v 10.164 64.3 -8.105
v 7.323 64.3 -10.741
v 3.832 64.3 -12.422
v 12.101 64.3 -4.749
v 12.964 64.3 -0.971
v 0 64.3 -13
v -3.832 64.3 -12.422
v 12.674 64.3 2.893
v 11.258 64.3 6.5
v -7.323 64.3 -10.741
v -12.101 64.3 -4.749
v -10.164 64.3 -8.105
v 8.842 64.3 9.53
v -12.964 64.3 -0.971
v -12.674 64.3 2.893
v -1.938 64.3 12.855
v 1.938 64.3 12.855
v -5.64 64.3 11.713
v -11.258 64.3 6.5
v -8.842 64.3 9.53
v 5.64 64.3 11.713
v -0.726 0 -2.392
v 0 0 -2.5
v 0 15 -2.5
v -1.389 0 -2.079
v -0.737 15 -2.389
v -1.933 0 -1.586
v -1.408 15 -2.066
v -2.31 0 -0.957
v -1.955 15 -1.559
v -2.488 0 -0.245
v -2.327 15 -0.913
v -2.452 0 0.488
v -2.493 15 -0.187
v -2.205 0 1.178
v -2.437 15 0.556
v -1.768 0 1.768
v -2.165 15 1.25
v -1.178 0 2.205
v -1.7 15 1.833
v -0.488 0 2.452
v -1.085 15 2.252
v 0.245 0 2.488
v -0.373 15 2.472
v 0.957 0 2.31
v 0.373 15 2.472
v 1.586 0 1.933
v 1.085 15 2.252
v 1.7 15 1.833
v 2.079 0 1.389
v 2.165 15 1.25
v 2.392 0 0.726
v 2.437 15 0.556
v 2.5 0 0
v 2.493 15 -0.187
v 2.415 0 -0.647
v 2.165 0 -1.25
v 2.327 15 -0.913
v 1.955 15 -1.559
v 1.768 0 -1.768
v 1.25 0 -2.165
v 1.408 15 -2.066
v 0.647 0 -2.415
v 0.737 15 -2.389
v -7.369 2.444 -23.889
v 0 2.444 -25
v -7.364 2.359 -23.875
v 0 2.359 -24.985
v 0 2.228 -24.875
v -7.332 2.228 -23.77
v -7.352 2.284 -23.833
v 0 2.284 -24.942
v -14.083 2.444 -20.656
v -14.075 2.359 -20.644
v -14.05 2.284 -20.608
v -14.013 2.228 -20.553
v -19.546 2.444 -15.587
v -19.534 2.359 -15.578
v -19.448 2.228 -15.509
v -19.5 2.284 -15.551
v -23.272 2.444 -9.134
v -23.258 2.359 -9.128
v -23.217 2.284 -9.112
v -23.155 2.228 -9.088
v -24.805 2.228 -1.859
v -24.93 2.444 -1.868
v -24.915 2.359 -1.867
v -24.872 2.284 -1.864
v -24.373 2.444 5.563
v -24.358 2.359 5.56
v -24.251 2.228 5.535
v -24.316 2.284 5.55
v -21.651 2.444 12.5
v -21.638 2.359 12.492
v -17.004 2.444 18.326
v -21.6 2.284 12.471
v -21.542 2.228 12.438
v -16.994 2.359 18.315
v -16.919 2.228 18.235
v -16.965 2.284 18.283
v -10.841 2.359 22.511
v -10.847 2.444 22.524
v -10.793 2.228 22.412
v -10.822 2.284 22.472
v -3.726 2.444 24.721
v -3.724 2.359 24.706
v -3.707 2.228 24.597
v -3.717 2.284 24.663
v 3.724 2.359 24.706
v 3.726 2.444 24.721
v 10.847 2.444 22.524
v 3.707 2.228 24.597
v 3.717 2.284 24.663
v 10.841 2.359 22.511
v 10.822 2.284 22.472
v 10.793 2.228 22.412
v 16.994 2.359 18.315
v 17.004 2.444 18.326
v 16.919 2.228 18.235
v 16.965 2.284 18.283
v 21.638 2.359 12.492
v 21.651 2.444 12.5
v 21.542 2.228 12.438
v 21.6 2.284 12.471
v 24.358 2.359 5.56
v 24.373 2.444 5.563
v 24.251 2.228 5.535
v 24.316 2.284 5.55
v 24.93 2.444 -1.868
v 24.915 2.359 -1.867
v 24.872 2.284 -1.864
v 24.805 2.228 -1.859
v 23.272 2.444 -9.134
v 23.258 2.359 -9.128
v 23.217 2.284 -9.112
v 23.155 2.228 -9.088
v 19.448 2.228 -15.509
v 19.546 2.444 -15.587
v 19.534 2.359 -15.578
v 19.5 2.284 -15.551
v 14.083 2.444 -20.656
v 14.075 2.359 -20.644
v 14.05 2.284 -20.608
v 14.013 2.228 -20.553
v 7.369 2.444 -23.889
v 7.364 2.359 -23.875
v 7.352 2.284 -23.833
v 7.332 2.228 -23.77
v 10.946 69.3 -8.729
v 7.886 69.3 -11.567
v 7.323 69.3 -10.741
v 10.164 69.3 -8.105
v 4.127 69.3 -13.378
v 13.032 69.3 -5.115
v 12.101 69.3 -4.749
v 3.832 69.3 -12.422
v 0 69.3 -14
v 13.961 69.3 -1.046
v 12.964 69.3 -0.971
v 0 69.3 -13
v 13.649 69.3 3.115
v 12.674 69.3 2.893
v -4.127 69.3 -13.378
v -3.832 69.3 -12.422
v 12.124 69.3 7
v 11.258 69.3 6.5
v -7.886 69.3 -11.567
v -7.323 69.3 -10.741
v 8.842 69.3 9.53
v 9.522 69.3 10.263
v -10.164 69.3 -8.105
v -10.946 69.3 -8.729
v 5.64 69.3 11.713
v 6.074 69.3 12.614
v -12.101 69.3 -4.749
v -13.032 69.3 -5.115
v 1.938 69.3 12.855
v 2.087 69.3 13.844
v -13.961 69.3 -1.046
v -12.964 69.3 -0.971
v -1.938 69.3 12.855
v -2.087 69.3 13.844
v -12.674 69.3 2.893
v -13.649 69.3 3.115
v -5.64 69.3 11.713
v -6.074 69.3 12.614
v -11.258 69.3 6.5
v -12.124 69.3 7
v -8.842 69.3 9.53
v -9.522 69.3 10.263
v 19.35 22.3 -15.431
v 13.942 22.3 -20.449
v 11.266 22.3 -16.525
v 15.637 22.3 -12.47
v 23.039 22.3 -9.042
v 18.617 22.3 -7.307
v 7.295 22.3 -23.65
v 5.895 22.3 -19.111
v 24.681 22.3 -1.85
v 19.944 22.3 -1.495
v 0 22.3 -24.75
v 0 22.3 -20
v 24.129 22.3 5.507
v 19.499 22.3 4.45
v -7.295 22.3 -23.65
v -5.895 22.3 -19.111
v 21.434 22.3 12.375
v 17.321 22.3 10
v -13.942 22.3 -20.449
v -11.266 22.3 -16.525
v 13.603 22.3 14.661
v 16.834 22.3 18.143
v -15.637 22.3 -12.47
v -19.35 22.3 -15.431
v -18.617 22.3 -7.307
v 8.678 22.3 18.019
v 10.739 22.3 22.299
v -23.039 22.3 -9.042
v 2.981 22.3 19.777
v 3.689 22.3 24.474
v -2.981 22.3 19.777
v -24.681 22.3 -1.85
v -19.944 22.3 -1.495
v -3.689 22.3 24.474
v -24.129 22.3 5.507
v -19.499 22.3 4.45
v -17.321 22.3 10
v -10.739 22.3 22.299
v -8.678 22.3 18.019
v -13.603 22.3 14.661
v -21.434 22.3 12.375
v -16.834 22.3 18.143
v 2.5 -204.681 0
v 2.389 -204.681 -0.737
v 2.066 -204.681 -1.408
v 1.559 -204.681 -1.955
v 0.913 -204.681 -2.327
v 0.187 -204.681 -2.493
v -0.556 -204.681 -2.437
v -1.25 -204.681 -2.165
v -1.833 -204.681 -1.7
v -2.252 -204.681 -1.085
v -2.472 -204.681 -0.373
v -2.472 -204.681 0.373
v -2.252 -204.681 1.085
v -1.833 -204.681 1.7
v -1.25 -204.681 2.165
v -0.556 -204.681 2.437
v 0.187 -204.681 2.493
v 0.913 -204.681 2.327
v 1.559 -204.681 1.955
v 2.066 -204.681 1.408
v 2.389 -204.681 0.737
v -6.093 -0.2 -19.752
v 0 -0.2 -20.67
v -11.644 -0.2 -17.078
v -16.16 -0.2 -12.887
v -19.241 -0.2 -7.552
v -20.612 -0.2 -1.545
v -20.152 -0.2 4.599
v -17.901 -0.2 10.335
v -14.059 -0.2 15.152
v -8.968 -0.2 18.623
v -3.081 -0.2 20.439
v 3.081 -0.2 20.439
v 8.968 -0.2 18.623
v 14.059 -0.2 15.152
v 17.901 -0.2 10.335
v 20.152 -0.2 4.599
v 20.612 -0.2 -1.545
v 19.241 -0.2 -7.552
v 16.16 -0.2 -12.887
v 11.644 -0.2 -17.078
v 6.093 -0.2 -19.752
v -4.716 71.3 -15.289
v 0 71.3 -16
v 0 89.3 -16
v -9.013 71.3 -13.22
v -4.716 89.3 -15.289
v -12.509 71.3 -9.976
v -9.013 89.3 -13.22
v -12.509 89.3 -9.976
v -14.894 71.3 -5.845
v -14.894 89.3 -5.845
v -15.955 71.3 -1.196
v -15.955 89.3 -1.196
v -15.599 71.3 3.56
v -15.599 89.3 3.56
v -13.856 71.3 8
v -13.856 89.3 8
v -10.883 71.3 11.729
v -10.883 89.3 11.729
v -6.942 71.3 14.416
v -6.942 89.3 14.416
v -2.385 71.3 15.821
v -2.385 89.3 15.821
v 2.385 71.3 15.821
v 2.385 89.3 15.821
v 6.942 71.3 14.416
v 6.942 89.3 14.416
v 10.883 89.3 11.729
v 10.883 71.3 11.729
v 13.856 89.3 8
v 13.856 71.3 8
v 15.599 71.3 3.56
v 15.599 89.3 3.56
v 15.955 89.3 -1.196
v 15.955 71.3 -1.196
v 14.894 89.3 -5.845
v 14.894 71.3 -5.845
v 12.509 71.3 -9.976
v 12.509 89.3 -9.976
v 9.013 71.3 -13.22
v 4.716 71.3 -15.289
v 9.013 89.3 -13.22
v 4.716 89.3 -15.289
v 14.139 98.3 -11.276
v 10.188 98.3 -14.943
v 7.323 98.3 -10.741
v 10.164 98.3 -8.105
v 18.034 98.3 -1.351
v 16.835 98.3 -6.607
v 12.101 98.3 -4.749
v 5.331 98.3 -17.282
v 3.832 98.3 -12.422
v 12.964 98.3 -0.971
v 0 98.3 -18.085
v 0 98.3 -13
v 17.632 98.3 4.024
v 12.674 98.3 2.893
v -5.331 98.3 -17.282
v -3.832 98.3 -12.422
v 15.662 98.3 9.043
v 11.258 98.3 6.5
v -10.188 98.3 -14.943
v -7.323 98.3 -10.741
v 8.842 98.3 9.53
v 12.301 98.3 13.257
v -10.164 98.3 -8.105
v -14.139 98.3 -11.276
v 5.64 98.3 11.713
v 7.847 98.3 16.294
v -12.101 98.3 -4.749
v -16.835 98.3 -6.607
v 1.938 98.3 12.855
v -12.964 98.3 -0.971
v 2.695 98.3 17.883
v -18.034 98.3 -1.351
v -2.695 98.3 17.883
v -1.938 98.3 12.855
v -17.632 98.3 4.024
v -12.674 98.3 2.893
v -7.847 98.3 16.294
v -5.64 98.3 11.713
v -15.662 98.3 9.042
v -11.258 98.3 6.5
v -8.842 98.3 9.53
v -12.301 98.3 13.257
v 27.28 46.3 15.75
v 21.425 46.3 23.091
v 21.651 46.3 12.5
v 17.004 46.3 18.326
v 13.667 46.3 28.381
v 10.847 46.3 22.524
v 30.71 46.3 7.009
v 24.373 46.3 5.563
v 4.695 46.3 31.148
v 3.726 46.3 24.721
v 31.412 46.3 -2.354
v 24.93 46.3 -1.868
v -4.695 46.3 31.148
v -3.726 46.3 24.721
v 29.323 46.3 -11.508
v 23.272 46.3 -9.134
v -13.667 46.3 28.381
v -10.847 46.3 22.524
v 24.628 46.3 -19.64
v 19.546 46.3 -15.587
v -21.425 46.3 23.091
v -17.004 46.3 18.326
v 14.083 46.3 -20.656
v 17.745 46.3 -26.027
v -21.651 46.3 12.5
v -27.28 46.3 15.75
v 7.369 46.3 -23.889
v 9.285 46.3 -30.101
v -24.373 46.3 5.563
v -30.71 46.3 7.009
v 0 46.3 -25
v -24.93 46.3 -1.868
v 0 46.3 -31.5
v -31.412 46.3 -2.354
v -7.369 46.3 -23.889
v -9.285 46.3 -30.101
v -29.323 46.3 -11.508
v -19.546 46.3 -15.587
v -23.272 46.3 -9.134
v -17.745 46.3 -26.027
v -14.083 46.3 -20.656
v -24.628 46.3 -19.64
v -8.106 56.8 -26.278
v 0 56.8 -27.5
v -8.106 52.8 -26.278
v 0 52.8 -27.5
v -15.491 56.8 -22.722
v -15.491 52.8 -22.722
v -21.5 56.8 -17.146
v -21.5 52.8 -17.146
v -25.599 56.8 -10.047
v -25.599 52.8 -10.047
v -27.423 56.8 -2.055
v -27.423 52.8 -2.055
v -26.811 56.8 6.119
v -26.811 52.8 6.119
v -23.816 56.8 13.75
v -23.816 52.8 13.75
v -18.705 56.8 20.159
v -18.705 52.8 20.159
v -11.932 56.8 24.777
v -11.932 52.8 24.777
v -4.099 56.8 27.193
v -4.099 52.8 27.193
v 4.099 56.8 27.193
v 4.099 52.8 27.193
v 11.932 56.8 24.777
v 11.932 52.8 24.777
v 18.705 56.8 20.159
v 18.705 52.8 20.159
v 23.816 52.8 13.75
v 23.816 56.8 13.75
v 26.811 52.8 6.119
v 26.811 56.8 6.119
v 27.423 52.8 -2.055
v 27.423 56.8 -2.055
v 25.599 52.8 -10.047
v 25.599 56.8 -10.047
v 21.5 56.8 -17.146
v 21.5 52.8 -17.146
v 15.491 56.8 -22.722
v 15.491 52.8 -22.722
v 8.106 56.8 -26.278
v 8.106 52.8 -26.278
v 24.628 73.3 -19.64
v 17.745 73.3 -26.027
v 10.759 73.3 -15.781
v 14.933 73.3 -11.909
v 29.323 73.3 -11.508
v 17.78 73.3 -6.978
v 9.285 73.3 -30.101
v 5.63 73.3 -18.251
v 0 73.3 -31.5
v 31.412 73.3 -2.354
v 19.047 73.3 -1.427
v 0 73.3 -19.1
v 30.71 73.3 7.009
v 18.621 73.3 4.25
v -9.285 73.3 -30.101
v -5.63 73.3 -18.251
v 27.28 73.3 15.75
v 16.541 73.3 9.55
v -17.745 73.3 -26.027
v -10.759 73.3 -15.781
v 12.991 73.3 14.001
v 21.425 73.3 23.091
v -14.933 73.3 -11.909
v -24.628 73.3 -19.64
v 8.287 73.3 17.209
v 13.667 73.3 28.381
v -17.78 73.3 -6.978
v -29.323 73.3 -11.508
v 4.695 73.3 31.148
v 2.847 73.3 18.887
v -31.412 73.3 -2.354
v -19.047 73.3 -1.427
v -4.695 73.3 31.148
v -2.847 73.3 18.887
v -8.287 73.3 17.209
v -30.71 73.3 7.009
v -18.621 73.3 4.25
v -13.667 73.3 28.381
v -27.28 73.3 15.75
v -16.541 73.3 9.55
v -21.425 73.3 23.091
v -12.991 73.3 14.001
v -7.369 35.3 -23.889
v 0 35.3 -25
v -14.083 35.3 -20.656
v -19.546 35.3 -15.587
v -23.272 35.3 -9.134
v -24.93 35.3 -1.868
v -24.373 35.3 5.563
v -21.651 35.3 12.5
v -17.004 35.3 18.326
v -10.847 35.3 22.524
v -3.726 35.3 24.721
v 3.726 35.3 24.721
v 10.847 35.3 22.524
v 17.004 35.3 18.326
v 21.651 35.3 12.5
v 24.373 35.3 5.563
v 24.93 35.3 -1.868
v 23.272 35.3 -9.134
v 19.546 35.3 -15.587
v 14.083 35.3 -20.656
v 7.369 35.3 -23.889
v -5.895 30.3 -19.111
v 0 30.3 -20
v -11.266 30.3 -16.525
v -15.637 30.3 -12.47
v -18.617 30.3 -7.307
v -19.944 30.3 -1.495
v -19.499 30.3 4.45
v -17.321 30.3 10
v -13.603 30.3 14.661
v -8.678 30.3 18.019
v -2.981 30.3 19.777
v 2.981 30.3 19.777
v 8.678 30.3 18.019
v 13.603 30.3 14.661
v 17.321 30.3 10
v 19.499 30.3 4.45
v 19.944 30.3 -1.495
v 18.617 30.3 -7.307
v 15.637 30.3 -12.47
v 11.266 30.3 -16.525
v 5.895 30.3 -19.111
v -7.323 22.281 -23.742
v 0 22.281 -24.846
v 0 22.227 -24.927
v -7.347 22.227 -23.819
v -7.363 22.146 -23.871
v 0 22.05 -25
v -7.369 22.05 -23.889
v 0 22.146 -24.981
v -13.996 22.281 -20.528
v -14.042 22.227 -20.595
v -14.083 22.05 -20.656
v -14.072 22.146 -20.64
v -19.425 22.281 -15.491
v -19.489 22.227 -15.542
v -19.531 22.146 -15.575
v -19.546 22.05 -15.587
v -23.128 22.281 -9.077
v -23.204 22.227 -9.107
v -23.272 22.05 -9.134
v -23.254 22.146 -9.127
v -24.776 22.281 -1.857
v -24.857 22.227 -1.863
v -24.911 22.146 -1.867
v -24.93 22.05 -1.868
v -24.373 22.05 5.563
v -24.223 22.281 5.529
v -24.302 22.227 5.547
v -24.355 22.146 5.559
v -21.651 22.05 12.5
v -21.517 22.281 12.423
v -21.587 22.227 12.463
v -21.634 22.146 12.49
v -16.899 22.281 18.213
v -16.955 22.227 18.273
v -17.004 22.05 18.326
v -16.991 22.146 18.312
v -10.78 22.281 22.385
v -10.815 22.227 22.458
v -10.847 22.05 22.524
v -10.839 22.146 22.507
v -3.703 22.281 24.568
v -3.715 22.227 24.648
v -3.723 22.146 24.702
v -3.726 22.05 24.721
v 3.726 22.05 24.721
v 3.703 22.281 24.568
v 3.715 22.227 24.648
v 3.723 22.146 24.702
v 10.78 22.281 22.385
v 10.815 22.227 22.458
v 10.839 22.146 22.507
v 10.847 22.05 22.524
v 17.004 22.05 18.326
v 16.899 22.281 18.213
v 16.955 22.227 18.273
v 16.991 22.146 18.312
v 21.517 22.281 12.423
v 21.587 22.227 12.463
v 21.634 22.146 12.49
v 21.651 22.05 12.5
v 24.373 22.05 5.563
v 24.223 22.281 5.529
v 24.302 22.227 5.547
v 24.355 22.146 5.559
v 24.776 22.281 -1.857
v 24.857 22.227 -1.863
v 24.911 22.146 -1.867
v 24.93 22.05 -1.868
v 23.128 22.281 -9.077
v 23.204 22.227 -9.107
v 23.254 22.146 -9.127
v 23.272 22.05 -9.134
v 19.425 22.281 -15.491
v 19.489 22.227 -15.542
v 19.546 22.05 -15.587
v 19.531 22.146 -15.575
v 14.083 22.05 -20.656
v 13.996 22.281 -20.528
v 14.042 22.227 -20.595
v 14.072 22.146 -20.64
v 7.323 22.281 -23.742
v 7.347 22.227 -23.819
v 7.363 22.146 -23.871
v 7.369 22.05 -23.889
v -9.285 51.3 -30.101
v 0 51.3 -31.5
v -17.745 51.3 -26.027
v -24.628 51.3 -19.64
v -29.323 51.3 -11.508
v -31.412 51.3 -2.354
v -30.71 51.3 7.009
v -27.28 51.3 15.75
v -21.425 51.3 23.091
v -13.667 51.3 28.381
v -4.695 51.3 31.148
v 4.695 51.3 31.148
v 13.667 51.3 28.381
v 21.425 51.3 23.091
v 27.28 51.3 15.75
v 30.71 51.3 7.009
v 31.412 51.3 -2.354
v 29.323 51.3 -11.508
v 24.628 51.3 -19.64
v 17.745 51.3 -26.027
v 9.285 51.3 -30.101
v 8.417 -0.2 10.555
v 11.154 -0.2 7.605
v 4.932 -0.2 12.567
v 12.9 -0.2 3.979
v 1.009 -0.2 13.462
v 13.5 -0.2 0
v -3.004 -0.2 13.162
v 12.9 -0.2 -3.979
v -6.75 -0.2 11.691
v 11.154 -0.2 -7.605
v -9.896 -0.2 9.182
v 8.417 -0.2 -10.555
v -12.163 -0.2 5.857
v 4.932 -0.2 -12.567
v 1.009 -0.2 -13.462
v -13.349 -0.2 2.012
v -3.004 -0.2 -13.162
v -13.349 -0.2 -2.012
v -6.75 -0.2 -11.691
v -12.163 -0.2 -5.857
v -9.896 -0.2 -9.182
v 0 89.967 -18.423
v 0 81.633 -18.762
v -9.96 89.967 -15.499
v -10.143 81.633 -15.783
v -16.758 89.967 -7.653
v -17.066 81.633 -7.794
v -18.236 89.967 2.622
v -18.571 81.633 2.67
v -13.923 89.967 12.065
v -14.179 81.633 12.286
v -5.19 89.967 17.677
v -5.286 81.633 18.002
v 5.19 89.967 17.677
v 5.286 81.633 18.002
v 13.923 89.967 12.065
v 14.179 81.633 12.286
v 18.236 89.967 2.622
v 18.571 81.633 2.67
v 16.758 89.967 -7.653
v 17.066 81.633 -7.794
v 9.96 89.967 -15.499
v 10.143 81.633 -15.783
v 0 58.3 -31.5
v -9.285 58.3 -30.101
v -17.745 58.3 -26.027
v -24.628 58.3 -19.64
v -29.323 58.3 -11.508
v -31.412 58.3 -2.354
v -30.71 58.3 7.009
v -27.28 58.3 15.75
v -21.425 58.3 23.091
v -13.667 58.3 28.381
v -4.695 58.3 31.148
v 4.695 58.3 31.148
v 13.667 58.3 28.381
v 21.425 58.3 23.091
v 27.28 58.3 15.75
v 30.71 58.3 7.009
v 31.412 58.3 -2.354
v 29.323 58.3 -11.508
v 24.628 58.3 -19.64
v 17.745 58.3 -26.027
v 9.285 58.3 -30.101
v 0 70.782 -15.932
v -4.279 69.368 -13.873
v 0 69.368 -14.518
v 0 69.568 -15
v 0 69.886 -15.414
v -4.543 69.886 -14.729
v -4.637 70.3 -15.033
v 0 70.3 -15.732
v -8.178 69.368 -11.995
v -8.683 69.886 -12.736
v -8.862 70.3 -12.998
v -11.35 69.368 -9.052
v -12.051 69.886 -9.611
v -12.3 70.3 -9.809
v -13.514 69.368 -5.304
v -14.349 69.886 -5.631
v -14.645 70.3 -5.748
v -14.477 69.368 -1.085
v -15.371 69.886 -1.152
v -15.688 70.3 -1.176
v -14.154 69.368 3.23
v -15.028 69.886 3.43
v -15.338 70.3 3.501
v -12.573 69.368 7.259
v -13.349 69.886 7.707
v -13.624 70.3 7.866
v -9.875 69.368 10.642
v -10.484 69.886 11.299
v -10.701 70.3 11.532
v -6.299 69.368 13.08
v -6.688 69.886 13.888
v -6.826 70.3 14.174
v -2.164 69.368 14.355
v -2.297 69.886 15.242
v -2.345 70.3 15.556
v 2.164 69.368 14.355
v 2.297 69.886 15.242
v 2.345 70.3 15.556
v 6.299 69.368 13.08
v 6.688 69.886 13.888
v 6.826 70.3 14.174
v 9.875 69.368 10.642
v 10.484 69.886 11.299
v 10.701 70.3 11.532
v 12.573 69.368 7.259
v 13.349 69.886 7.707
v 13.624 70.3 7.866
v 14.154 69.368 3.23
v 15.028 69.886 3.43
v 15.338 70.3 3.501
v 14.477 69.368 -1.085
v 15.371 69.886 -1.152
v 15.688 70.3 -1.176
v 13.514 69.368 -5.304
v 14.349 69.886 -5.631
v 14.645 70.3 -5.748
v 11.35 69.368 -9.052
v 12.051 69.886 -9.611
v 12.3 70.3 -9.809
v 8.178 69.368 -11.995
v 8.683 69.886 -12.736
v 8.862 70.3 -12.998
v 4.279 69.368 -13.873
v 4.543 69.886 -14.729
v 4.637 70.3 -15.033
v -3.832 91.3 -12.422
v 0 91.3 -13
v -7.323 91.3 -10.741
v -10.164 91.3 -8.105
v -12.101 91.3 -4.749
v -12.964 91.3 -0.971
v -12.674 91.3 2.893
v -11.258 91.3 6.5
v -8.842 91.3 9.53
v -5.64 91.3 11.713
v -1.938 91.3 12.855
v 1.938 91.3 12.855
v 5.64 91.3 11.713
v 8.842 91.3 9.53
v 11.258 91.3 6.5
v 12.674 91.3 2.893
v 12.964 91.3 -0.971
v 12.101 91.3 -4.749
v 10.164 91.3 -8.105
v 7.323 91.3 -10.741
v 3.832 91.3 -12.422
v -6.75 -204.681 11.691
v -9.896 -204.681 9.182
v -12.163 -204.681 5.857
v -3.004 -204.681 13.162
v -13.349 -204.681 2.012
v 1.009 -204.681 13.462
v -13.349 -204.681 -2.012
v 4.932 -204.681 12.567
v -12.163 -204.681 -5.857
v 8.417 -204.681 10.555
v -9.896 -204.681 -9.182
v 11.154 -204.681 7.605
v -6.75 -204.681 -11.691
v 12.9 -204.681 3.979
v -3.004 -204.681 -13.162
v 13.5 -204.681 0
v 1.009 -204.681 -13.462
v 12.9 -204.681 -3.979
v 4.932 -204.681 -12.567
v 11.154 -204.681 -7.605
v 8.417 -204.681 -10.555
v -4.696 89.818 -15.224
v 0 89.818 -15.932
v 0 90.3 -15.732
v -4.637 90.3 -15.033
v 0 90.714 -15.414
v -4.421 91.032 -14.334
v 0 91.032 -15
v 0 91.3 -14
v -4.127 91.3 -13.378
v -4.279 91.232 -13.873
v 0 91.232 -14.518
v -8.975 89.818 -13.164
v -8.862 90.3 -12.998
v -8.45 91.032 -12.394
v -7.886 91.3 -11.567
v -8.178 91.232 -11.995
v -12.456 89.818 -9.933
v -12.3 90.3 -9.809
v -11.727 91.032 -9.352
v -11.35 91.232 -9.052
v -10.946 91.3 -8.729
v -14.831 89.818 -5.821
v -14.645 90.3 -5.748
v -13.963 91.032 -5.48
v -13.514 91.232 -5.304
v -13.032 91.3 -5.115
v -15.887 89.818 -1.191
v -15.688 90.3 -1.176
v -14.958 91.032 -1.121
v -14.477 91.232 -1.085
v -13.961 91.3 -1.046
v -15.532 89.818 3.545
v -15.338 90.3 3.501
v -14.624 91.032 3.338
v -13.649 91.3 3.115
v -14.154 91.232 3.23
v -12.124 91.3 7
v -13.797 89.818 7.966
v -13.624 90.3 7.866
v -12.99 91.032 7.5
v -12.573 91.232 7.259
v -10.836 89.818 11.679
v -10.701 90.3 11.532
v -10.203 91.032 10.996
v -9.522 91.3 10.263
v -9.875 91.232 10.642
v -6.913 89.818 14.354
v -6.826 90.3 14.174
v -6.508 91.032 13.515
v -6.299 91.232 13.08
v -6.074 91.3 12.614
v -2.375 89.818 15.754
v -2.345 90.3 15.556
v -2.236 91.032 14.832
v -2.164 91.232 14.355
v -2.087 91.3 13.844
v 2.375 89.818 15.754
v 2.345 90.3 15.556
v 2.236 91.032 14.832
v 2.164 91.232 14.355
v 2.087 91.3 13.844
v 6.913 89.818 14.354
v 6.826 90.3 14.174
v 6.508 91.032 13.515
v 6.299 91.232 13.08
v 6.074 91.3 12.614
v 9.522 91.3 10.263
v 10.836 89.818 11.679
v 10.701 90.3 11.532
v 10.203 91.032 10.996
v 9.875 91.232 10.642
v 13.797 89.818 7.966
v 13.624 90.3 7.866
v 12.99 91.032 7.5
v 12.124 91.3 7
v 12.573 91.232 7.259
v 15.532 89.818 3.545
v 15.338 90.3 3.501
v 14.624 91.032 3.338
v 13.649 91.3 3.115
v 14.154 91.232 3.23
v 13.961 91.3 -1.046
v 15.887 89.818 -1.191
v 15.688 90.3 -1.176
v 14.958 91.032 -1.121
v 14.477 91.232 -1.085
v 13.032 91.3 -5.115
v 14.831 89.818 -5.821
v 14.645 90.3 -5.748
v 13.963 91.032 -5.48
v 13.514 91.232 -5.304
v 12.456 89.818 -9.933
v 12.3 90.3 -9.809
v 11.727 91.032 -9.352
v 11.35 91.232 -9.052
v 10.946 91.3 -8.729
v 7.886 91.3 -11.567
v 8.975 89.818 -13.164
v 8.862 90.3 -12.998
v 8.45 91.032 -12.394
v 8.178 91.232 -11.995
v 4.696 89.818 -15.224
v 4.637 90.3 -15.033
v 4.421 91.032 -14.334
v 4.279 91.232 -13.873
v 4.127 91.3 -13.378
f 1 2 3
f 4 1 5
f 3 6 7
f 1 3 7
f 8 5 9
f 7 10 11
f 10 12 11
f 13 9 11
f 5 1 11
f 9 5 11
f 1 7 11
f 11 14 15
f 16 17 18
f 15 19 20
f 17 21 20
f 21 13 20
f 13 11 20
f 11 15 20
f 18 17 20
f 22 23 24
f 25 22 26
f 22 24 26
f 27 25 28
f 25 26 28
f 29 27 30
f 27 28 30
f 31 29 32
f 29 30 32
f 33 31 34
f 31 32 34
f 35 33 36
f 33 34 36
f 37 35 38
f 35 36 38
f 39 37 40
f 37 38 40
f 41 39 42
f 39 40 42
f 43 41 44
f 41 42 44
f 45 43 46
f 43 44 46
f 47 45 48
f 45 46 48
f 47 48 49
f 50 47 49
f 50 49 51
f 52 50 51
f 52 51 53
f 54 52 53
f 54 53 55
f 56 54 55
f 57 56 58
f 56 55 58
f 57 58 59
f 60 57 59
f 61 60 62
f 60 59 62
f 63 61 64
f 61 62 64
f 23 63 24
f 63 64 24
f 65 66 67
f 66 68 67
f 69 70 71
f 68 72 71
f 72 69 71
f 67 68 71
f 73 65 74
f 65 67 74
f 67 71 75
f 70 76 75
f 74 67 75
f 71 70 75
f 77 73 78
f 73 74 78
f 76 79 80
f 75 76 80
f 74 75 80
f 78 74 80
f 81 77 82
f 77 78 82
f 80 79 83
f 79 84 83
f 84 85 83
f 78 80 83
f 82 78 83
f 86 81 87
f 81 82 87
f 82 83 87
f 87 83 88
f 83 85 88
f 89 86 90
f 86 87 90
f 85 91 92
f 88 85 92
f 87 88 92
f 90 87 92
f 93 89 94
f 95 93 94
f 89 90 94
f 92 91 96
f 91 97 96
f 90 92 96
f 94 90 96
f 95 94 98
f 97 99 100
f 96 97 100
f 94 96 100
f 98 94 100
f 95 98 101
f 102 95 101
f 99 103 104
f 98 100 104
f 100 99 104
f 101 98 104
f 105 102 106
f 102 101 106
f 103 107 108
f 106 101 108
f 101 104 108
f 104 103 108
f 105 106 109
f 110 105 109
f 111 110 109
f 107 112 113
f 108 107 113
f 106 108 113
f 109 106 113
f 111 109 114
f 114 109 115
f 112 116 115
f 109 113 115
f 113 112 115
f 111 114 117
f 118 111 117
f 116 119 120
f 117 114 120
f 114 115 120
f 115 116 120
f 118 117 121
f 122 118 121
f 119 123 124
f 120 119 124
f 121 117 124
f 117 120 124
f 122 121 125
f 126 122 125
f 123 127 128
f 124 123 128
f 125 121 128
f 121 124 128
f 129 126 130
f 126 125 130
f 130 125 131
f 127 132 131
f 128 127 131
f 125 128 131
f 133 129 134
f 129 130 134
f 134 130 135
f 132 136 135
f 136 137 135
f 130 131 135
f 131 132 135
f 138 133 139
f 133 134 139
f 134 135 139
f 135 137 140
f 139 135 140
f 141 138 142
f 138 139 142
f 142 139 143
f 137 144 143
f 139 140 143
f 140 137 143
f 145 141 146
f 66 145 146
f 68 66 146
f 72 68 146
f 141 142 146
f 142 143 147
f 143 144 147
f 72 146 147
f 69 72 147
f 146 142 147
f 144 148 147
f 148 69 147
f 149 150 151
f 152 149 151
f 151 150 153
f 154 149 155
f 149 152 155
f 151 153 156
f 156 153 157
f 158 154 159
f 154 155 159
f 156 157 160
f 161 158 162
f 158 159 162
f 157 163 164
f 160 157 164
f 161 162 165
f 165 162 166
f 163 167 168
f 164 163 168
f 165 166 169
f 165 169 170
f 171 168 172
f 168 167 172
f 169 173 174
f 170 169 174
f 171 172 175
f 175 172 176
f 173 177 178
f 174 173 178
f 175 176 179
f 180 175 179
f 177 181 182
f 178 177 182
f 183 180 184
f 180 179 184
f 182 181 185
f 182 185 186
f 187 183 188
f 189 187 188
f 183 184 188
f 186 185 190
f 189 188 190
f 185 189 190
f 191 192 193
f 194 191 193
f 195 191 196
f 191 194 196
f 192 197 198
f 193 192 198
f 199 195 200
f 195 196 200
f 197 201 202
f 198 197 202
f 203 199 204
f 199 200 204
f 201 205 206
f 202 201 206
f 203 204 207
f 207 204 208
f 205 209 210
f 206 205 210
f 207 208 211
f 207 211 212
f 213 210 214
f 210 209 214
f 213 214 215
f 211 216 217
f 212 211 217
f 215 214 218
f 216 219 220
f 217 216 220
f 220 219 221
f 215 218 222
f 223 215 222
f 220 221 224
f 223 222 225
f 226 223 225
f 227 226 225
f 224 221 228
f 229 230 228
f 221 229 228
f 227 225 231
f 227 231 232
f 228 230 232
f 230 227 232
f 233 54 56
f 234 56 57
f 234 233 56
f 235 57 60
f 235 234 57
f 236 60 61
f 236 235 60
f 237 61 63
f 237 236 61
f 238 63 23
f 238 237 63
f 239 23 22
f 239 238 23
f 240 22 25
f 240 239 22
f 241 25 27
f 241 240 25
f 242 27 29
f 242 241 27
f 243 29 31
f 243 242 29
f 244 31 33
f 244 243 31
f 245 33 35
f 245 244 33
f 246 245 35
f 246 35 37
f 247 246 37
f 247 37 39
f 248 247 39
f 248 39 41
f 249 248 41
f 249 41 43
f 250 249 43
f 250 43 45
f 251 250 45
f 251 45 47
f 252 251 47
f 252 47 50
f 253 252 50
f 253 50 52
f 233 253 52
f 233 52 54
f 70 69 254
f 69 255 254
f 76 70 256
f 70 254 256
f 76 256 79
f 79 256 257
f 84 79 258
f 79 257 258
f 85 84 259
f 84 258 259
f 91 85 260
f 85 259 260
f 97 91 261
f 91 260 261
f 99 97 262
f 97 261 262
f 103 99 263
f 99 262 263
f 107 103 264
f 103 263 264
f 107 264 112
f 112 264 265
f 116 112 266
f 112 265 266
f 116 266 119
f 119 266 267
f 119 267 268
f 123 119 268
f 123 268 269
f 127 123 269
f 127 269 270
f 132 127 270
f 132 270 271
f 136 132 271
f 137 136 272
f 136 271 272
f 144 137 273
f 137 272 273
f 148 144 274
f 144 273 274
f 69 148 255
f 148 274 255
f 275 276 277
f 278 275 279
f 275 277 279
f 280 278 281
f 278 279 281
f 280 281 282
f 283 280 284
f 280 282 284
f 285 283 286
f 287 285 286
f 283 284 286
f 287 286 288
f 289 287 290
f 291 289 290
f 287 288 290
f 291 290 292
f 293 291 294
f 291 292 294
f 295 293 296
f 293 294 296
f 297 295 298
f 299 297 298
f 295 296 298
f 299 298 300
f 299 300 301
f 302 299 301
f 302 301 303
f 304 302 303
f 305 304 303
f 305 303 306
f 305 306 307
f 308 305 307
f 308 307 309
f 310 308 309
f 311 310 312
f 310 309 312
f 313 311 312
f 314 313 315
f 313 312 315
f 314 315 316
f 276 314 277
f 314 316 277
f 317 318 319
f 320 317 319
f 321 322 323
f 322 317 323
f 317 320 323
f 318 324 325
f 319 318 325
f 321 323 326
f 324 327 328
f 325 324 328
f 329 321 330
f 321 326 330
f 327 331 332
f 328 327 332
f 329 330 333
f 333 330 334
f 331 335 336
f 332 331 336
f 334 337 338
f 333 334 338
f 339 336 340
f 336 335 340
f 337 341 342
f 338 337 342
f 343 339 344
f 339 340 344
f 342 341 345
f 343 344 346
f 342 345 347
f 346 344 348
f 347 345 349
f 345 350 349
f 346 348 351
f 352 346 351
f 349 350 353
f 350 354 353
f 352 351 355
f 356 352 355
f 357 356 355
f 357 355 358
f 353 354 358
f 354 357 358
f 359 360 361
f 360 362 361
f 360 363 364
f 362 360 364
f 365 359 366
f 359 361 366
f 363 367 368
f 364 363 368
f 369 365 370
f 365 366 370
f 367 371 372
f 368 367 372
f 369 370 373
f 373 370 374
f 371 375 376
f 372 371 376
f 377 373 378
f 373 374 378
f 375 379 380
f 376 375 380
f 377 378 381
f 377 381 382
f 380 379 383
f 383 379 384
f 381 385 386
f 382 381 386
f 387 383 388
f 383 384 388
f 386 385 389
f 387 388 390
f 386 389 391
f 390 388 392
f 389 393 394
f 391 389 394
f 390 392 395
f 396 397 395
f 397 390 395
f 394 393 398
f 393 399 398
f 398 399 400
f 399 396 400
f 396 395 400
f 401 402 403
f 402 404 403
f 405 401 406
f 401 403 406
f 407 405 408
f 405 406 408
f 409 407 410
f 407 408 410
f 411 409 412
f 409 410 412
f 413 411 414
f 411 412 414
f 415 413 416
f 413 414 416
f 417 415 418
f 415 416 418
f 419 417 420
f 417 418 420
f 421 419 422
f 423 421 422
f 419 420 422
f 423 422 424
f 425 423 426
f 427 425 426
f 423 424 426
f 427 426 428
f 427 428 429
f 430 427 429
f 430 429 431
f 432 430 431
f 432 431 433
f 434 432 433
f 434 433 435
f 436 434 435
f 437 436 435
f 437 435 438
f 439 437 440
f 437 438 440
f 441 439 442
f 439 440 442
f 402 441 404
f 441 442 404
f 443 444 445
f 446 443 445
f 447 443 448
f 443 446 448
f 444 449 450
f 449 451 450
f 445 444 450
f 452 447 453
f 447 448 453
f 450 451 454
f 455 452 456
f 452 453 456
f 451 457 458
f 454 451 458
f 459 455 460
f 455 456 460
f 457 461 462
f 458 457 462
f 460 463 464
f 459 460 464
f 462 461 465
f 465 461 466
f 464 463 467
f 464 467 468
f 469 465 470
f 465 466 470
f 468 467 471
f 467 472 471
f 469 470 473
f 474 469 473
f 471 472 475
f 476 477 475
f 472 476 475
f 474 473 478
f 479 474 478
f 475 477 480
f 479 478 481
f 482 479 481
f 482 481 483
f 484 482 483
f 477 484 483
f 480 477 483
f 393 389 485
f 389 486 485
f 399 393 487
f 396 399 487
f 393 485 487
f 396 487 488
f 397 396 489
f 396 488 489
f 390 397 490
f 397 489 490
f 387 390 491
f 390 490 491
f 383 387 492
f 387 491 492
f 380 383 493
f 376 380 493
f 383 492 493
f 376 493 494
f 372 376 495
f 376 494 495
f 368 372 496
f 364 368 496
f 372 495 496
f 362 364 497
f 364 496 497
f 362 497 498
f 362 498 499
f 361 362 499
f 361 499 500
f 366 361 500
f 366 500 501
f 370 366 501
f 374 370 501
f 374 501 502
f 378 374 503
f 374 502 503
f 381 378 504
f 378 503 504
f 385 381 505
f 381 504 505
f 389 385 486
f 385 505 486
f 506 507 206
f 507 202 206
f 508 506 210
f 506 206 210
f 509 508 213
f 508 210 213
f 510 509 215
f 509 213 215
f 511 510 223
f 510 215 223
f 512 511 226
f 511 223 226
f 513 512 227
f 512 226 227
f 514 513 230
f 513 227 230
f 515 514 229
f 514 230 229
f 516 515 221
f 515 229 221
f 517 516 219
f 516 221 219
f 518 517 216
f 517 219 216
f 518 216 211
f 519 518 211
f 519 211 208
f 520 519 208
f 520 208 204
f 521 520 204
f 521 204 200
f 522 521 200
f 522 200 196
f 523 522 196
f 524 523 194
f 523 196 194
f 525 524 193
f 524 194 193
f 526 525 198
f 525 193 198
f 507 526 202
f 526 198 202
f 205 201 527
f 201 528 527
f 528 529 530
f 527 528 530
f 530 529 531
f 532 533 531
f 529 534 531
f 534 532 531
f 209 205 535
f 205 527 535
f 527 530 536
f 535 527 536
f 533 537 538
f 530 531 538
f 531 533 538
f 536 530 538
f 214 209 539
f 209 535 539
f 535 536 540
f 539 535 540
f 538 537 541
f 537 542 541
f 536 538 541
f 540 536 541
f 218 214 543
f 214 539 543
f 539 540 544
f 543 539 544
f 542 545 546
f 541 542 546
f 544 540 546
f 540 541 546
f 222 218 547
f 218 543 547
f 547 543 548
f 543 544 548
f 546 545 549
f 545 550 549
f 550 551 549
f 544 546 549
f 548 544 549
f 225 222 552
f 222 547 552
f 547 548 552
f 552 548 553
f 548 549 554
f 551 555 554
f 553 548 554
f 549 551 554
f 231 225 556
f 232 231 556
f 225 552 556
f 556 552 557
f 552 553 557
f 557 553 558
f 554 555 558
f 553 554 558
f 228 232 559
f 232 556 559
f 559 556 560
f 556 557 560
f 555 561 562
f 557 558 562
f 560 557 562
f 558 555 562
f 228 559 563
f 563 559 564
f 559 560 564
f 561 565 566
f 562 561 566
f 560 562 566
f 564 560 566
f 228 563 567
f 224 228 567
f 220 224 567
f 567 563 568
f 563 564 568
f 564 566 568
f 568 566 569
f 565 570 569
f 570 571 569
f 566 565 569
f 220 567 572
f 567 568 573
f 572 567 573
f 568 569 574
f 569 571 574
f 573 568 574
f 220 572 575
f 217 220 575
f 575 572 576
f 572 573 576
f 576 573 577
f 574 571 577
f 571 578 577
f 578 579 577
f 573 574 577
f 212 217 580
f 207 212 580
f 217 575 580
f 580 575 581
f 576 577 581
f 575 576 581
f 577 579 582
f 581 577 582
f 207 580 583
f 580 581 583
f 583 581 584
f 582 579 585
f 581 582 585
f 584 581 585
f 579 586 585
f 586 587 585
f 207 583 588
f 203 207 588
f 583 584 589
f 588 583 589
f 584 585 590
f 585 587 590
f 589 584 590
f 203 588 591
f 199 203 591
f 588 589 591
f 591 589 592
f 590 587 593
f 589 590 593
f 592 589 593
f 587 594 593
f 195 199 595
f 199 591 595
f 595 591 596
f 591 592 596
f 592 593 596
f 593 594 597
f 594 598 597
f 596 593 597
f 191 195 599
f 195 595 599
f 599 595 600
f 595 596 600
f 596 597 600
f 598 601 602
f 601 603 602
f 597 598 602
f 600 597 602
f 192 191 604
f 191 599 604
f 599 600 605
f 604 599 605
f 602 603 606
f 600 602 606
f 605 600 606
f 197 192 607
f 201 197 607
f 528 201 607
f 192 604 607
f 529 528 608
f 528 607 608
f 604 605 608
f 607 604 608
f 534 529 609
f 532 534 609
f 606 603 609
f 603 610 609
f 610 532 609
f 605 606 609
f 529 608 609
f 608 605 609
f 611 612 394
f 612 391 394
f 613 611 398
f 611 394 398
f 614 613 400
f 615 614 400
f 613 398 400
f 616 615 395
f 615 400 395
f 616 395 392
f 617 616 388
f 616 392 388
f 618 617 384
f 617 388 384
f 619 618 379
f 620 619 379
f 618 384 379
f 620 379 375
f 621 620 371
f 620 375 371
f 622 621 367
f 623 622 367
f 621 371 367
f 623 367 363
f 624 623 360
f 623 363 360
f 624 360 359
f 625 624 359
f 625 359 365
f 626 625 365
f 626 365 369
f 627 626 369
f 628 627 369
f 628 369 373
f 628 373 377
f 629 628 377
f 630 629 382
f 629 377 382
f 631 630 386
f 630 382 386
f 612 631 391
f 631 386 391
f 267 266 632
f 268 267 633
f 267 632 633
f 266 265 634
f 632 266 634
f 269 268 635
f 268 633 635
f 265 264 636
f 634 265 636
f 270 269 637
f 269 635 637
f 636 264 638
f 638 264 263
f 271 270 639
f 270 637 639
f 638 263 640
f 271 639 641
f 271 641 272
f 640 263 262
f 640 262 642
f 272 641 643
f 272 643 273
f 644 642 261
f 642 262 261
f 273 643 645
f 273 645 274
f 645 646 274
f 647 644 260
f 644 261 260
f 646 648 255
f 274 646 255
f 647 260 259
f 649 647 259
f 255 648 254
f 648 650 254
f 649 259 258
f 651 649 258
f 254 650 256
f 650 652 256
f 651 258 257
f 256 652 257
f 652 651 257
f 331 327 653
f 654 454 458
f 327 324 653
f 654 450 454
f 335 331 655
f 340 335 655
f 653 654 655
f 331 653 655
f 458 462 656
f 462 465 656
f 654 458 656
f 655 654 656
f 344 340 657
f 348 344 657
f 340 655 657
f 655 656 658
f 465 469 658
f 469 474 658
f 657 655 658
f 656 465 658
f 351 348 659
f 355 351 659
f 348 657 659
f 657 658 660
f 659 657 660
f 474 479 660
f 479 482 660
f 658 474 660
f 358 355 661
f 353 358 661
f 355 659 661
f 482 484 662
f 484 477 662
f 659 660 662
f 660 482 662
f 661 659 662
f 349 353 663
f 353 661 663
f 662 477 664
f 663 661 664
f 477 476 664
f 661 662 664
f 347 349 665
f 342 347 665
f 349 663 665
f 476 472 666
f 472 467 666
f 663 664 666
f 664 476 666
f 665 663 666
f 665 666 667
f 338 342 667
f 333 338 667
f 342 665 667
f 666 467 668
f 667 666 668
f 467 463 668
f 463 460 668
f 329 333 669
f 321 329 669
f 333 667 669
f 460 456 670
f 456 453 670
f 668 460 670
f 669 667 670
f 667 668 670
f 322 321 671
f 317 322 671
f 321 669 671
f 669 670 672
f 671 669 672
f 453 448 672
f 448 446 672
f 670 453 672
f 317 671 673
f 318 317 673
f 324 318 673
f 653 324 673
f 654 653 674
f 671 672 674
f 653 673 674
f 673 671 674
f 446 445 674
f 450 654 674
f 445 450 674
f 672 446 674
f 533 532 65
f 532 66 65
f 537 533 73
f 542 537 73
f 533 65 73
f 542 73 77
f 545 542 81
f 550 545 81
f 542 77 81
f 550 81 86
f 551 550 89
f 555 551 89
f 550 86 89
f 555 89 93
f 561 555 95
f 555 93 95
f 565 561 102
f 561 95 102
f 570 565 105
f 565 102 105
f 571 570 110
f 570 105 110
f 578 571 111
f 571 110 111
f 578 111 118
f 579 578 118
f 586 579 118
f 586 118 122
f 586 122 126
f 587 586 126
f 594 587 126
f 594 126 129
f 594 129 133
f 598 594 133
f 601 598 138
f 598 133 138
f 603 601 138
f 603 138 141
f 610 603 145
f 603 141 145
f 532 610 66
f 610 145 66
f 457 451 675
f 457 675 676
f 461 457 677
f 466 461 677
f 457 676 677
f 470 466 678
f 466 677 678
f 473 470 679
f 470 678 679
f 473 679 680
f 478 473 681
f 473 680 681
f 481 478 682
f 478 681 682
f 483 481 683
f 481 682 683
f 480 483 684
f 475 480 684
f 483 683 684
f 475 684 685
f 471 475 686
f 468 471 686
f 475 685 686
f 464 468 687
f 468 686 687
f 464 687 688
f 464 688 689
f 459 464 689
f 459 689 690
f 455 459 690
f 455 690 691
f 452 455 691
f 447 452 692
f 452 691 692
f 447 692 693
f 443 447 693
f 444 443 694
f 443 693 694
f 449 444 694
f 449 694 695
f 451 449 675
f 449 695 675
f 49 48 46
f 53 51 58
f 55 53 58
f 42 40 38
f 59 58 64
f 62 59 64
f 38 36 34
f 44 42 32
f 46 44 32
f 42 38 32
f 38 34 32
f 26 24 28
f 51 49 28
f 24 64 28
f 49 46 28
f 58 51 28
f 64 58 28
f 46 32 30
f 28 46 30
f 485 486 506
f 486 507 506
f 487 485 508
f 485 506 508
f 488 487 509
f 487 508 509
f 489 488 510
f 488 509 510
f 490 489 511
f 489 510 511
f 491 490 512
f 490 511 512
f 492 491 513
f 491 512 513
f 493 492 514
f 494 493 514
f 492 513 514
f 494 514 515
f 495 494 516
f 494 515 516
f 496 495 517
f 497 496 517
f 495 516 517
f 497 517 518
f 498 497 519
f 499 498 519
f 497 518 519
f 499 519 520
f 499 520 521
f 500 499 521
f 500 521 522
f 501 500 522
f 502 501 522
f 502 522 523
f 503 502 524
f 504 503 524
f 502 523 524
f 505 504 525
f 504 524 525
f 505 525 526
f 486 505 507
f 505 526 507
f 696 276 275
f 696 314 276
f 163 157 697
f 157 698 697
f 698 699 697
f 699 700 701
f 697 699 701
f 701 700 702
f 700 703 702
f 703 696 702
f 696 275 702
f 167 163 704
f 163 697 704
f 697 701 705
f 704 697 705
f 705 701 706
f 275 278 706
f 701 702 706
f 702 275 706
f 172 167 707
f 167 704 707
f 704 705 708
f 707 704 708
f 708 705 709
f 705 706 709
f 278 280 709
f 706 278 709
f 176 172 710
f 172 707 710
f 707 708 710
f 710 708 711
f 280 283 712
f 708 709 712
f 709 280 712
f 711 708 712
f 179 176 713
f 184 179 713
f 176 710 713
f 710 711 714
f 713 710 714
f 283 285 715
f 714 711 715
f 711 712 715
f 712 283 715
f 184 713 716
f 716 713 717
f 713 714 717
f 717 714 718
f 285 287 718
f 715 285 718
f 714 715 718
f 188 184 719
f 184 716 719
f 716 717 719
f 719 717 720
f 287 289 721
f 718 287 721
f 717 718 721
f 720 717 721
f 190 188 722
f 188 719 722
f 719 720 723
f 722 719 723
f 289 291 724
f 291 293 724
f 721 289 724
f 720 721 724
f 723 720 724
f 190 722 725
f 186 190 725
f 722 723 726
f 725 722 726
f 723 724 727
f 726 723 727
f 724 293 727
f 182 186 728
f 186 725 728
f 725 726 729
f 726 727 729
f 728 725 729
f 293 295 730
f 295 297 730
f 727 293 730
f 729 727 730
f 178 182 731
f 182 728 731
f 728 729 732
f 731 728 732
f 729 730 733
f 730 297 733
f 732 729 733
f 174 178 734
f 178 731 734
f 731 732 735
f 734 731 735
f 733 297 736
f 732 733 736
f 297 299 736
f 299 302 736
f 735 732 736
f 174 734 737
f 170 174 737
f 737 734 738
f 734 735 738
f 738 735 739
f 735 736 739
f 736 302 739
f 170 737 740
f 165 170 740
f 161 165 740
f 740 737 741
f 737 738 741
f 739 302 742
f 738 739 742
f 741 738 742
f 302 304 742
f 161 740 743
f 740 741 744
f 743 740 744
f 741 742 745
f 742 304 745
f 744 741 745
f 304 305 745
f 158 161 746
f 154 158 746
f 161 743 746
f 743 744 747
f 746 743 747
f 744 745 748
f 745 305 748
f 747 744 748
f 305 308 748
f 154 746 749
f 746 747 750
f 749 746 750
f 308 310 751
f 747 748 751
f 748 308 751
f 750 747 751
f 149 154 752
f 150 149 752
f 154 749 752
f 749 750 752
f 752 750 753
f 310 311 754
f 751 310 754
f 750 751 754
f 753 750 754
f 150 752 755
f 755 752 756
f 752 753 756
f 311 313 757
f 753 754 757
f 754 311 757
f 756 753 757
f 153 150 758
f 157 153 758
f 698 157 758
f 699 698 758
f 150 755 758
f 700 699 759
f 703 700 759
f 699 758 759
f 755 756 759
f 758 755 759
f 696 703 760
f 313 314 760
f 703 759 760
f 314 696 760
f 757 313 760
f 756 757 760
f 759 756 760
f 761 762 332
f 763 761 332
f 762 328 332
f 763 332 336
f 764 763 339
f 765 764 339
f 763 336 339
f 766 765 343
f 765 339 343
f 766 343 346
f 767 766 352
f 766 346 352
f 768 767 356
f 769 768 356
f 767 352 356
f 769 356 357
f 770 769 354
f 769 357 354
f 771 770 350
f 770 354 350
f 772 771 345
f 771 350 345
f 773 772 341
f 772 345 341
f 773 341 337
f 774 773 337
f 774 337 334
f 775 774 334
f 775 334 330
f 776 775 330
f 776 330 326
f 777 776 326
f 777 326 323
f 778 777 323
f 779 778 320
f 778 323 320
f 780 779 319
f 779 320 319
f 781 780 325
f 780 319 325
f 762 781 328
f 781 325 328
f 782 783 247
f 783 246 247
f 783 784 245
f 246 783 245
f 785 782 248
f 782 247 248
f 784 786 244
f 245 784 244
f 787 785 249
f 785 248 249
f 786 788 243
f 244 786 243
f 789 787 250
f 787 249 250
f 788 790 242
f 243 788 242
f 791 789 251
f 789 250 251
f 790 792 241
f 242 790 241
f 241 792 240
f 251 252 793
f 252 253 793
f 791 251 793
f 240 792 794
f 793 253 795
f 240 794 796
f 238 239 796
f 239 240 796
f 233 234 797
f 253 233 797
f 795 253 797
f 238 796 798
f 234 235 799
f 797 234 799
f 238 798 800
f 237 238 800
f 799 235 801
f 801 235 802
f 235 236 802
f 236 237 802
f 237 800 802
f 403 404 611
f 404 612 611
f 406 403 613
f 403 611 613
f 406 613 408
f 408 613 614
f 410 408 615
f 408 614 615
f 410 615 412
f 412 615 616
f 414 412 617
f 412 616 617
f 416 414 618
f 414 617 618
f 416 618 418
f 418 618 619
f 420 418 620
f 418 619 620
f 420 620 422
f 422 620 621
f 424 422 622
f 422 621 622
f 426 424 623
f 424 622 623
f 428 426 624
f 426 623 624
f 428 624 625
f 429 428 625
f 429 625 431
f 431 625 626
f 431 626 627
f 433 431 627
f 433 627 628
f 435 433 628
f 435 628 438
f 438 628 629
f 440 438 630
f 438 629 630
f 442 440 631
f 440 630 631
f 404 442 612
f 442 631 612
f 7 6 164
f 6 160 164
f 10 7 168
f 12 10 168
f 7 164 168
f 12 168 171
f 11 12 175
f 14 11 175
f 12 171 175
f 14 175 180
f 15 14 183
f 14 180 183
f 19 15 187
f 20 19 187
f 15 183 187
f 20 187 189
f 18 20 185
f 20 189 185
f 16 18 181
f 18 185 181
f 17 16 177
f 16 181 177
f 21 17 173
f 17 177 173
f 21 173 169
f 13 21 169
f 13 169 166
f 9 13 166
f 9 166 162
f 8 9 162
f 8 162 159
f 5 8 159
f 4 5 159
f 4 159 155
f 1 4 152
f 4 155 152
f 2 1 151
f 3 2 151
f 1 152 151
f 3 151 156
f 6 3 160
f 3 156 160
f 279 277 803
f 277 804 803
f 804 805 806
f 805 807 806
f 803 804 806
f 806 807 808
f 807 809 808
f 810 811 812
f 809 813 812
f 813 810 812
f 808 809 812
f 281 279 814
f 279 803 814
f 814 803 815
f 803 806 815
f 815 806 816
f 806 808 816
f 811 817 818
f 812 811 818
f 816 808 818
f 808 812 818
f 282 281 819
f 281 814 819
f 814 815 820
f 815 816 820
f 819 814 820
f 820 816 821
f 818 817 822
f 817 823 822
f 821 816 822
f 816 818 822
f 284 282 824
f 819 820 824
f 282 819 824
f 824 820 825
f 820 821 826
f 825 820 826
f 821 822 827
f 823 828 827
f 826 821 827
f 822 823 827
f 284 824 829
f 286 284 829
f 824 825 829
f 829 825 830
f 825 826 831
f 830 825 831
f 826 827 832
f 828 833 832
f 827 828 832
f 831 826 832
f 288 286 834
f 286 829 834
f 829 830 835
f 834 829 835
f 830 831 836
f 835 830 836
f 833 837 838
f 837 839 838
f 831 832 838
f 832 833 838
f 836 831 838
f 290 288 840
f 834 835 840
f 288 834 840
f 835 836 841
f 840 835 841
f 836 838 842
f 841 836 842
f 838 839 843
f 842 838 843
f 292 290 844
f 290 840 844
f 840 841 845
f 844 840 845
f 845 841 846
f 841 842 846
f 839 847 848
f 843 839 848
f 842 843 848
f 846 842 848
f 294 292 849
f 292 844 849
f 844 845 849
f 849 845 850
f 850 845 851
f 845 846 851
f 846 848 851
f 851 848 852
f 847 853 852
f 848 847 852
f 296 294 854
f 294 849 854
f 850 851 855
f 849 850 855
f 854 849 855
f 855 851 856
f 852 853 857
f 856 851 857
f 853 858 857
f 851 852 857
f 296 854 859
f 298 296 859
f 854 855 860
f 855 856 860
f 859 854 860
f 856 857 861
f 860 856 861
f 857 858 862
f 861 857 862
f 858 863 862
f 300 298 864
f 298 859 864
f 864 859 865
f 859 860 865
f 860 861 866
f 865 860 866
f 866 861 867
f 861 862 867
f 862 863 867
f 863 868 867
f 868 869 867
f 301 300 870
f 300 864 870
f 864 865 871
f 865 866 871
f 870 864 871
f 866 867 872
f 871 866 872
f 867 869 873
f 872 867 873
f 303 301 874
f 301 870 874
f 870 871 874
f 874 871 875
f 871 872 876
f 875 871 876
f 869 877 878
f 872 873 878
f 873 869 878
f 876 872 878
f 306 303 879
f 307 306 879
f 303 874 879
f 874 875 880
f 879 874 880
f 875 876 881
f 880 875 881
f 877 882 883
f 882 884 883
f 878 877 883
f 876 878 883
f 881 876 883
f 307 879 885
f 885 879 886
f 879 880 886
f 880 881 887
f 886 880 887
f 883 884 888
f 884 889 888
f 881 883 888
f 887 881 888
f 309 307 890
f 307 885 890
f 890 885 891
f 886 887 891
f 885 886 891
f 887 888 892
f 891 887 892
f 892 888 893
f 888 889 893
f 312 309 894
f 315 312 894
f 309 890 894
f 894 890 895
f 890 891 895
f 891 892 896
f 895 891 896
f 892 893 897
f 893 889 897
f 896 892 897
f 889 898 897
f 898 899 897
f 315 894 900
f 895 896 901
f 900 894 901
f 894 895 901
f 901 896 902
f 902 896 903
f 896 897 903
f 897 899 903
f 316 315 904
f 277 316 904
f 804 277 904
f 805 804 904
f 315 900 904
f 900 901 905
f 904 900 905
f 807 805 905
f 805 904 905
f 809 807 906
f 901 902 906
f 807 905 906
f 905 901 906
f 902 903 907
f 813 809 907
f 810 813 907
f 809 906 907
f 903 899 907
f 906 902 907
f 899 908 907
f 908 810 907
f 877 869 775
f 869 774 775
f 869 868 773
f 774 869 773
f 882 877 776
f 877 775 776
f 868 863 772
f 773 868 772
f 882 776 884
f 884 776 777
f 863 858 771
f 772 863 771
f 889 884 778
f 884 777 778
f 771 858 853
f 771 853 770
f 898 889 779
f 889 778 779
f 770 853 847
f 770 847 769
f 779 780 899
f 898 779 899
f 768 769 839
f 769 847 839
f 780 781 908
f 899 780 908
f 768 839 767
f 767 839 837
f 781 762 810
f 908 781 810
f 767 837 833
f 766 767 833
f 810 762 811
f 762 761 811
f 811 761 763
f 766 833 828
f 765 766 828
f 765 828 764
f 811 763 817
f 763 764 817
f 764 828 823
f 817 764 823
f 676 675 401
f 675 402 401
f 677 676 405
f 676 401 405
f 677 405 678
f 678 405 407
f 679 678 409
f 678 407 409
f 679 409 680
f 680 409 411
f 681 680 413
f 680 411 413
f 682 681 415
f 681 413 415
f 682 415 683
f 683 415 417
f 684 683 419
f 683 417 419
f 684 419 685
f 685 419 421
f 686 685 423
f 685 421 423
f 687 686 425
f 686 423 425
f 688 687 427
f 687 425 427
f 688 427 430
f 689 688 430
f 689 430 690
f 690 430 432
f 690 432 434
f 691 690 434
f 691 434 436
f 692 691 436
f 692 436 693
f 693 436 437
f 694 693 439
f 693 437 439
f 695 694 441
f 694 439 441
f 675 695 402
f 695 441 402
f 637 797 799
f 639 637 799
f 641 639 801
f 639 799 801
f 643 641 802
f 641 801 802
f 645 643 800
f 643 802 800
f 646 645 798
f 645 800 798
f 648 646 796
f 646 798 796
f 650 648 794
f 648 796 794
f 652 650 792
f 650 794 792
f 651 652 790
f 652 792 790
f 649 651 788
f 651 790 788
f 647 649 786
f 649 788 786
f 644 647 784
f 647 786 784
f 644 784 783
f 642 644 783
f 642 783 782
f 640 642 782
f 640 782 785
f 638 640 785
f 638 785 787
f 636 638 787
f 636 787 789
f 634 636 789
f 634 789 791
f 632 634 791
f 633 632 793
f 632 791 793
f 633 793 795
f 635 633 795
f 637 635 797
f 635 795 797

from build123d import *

# Parameters (mm, degrees)
SWEEP1_START       = -204.68052275
SWEEP1_OUTLINE_R   = 13.5
SWEEP1_OUTLINE_R_2 = 2.5
SWEEP1_DEPTH       = 204.68052275


# Read off the part's stored shape, not the designer's step: Sweep1
with BuildPart() as part:
    # Sketch1 → Revolve1 (revolve)
    with BuildSketch(Plane.XY, mode=Mode.PRIVATE) as revolve1_sk:
        with BuildLine():
            Line((-13, 98.3), (-18.085, 98.3))
            Line((-18.085, 98.3), (-19.1, 73.3))
            Line((-19.1, 73.3), (-31.5, 73.3))
            Line((-31.5, 73.3), (-31.5, 58.3))
            Line((-31.5, 58.3), (-27.5, 56.8))
            Line((-27.5, 56.8), (-27.5, 52.8))
            Line((-27.5, 52.8), (-31.5, 51.3))
            Line((-31.5, 51.3), (-31.5, 46.3))
            Line((-31.5, 46.3), (-25, 46.3))
            Line((-25, 46.3), (-25, 35.3))
            Line((-25, 35.3), (-20, 30.3))
            Line((-20, 30.3), (-20, 22.3))
            Line((-20, 22.3), (-24.75, 22.3))
            ThreePointArc((-24.75, 22.3), (-24.926776695, 22.226776695), (-25, 22.05))
            Line((-25, 22.05), (-25, 2.444337567))
            ThreePointArc((-25, 2.444337567), (-24.966506351, 2.319337567), (-24.875, 2.227831216))
            Line((-24.875, 2.227831216), (-20.669872981, -0.2))
            Line((-20.669872981, -0.2), (-13.5, -0.2))
            Line((-13.5, -0.2), (-13.5, 0))
            Line((-13.5, 0), (-2.5, 0))
            Line((-2.5, 0), (-2.5, 15))
            Line((-2.5, 15), (0, 15))
            Line((0, 15), (0, 64.3))
            Line((0, 64.3), (-13, 64.3))
            Line((-13, 64.3), (-13, 69.3))
            Line((-13, 69.3), (-14, 69.3))
            ThreePointArc((-14, 69.3), (-15.414213562, 69.885786438), (-16, 71.3))
            Line((-16, 71.3), (-16, 89.3))
            ThreePointArc((-16, 89.3), (-15.414213562, 90.714213562), (-14, 91.3))
            Line((-14, 91.3), (-13, 91.3))
            Line((-13, 91.3), (-13, 98.3))
        make_face()
    revolve(revolve1_sk.sketch.rotate(Axis((0, 0, 0), (0, 1, 0)), 270), axis=Axis((0, 0, 0), (0, 1, 0)))

    # Sweep1 outline → Sweep1 (add)
    with BuildSketch(Plane(origin=(0, 0, 0), x_dir=(1, 0, 0), z_dir=(0, 1, 0)).offset(SWEEP1_START)):
        Circle(SWEEP1_OUTLINE_R)
        Circle(SWEEP1_OUTLINE_R_2, mode=Mode.SUBTRACT)
    extrude(amount=SWEEP1_DEPTH)


solid = part.part
